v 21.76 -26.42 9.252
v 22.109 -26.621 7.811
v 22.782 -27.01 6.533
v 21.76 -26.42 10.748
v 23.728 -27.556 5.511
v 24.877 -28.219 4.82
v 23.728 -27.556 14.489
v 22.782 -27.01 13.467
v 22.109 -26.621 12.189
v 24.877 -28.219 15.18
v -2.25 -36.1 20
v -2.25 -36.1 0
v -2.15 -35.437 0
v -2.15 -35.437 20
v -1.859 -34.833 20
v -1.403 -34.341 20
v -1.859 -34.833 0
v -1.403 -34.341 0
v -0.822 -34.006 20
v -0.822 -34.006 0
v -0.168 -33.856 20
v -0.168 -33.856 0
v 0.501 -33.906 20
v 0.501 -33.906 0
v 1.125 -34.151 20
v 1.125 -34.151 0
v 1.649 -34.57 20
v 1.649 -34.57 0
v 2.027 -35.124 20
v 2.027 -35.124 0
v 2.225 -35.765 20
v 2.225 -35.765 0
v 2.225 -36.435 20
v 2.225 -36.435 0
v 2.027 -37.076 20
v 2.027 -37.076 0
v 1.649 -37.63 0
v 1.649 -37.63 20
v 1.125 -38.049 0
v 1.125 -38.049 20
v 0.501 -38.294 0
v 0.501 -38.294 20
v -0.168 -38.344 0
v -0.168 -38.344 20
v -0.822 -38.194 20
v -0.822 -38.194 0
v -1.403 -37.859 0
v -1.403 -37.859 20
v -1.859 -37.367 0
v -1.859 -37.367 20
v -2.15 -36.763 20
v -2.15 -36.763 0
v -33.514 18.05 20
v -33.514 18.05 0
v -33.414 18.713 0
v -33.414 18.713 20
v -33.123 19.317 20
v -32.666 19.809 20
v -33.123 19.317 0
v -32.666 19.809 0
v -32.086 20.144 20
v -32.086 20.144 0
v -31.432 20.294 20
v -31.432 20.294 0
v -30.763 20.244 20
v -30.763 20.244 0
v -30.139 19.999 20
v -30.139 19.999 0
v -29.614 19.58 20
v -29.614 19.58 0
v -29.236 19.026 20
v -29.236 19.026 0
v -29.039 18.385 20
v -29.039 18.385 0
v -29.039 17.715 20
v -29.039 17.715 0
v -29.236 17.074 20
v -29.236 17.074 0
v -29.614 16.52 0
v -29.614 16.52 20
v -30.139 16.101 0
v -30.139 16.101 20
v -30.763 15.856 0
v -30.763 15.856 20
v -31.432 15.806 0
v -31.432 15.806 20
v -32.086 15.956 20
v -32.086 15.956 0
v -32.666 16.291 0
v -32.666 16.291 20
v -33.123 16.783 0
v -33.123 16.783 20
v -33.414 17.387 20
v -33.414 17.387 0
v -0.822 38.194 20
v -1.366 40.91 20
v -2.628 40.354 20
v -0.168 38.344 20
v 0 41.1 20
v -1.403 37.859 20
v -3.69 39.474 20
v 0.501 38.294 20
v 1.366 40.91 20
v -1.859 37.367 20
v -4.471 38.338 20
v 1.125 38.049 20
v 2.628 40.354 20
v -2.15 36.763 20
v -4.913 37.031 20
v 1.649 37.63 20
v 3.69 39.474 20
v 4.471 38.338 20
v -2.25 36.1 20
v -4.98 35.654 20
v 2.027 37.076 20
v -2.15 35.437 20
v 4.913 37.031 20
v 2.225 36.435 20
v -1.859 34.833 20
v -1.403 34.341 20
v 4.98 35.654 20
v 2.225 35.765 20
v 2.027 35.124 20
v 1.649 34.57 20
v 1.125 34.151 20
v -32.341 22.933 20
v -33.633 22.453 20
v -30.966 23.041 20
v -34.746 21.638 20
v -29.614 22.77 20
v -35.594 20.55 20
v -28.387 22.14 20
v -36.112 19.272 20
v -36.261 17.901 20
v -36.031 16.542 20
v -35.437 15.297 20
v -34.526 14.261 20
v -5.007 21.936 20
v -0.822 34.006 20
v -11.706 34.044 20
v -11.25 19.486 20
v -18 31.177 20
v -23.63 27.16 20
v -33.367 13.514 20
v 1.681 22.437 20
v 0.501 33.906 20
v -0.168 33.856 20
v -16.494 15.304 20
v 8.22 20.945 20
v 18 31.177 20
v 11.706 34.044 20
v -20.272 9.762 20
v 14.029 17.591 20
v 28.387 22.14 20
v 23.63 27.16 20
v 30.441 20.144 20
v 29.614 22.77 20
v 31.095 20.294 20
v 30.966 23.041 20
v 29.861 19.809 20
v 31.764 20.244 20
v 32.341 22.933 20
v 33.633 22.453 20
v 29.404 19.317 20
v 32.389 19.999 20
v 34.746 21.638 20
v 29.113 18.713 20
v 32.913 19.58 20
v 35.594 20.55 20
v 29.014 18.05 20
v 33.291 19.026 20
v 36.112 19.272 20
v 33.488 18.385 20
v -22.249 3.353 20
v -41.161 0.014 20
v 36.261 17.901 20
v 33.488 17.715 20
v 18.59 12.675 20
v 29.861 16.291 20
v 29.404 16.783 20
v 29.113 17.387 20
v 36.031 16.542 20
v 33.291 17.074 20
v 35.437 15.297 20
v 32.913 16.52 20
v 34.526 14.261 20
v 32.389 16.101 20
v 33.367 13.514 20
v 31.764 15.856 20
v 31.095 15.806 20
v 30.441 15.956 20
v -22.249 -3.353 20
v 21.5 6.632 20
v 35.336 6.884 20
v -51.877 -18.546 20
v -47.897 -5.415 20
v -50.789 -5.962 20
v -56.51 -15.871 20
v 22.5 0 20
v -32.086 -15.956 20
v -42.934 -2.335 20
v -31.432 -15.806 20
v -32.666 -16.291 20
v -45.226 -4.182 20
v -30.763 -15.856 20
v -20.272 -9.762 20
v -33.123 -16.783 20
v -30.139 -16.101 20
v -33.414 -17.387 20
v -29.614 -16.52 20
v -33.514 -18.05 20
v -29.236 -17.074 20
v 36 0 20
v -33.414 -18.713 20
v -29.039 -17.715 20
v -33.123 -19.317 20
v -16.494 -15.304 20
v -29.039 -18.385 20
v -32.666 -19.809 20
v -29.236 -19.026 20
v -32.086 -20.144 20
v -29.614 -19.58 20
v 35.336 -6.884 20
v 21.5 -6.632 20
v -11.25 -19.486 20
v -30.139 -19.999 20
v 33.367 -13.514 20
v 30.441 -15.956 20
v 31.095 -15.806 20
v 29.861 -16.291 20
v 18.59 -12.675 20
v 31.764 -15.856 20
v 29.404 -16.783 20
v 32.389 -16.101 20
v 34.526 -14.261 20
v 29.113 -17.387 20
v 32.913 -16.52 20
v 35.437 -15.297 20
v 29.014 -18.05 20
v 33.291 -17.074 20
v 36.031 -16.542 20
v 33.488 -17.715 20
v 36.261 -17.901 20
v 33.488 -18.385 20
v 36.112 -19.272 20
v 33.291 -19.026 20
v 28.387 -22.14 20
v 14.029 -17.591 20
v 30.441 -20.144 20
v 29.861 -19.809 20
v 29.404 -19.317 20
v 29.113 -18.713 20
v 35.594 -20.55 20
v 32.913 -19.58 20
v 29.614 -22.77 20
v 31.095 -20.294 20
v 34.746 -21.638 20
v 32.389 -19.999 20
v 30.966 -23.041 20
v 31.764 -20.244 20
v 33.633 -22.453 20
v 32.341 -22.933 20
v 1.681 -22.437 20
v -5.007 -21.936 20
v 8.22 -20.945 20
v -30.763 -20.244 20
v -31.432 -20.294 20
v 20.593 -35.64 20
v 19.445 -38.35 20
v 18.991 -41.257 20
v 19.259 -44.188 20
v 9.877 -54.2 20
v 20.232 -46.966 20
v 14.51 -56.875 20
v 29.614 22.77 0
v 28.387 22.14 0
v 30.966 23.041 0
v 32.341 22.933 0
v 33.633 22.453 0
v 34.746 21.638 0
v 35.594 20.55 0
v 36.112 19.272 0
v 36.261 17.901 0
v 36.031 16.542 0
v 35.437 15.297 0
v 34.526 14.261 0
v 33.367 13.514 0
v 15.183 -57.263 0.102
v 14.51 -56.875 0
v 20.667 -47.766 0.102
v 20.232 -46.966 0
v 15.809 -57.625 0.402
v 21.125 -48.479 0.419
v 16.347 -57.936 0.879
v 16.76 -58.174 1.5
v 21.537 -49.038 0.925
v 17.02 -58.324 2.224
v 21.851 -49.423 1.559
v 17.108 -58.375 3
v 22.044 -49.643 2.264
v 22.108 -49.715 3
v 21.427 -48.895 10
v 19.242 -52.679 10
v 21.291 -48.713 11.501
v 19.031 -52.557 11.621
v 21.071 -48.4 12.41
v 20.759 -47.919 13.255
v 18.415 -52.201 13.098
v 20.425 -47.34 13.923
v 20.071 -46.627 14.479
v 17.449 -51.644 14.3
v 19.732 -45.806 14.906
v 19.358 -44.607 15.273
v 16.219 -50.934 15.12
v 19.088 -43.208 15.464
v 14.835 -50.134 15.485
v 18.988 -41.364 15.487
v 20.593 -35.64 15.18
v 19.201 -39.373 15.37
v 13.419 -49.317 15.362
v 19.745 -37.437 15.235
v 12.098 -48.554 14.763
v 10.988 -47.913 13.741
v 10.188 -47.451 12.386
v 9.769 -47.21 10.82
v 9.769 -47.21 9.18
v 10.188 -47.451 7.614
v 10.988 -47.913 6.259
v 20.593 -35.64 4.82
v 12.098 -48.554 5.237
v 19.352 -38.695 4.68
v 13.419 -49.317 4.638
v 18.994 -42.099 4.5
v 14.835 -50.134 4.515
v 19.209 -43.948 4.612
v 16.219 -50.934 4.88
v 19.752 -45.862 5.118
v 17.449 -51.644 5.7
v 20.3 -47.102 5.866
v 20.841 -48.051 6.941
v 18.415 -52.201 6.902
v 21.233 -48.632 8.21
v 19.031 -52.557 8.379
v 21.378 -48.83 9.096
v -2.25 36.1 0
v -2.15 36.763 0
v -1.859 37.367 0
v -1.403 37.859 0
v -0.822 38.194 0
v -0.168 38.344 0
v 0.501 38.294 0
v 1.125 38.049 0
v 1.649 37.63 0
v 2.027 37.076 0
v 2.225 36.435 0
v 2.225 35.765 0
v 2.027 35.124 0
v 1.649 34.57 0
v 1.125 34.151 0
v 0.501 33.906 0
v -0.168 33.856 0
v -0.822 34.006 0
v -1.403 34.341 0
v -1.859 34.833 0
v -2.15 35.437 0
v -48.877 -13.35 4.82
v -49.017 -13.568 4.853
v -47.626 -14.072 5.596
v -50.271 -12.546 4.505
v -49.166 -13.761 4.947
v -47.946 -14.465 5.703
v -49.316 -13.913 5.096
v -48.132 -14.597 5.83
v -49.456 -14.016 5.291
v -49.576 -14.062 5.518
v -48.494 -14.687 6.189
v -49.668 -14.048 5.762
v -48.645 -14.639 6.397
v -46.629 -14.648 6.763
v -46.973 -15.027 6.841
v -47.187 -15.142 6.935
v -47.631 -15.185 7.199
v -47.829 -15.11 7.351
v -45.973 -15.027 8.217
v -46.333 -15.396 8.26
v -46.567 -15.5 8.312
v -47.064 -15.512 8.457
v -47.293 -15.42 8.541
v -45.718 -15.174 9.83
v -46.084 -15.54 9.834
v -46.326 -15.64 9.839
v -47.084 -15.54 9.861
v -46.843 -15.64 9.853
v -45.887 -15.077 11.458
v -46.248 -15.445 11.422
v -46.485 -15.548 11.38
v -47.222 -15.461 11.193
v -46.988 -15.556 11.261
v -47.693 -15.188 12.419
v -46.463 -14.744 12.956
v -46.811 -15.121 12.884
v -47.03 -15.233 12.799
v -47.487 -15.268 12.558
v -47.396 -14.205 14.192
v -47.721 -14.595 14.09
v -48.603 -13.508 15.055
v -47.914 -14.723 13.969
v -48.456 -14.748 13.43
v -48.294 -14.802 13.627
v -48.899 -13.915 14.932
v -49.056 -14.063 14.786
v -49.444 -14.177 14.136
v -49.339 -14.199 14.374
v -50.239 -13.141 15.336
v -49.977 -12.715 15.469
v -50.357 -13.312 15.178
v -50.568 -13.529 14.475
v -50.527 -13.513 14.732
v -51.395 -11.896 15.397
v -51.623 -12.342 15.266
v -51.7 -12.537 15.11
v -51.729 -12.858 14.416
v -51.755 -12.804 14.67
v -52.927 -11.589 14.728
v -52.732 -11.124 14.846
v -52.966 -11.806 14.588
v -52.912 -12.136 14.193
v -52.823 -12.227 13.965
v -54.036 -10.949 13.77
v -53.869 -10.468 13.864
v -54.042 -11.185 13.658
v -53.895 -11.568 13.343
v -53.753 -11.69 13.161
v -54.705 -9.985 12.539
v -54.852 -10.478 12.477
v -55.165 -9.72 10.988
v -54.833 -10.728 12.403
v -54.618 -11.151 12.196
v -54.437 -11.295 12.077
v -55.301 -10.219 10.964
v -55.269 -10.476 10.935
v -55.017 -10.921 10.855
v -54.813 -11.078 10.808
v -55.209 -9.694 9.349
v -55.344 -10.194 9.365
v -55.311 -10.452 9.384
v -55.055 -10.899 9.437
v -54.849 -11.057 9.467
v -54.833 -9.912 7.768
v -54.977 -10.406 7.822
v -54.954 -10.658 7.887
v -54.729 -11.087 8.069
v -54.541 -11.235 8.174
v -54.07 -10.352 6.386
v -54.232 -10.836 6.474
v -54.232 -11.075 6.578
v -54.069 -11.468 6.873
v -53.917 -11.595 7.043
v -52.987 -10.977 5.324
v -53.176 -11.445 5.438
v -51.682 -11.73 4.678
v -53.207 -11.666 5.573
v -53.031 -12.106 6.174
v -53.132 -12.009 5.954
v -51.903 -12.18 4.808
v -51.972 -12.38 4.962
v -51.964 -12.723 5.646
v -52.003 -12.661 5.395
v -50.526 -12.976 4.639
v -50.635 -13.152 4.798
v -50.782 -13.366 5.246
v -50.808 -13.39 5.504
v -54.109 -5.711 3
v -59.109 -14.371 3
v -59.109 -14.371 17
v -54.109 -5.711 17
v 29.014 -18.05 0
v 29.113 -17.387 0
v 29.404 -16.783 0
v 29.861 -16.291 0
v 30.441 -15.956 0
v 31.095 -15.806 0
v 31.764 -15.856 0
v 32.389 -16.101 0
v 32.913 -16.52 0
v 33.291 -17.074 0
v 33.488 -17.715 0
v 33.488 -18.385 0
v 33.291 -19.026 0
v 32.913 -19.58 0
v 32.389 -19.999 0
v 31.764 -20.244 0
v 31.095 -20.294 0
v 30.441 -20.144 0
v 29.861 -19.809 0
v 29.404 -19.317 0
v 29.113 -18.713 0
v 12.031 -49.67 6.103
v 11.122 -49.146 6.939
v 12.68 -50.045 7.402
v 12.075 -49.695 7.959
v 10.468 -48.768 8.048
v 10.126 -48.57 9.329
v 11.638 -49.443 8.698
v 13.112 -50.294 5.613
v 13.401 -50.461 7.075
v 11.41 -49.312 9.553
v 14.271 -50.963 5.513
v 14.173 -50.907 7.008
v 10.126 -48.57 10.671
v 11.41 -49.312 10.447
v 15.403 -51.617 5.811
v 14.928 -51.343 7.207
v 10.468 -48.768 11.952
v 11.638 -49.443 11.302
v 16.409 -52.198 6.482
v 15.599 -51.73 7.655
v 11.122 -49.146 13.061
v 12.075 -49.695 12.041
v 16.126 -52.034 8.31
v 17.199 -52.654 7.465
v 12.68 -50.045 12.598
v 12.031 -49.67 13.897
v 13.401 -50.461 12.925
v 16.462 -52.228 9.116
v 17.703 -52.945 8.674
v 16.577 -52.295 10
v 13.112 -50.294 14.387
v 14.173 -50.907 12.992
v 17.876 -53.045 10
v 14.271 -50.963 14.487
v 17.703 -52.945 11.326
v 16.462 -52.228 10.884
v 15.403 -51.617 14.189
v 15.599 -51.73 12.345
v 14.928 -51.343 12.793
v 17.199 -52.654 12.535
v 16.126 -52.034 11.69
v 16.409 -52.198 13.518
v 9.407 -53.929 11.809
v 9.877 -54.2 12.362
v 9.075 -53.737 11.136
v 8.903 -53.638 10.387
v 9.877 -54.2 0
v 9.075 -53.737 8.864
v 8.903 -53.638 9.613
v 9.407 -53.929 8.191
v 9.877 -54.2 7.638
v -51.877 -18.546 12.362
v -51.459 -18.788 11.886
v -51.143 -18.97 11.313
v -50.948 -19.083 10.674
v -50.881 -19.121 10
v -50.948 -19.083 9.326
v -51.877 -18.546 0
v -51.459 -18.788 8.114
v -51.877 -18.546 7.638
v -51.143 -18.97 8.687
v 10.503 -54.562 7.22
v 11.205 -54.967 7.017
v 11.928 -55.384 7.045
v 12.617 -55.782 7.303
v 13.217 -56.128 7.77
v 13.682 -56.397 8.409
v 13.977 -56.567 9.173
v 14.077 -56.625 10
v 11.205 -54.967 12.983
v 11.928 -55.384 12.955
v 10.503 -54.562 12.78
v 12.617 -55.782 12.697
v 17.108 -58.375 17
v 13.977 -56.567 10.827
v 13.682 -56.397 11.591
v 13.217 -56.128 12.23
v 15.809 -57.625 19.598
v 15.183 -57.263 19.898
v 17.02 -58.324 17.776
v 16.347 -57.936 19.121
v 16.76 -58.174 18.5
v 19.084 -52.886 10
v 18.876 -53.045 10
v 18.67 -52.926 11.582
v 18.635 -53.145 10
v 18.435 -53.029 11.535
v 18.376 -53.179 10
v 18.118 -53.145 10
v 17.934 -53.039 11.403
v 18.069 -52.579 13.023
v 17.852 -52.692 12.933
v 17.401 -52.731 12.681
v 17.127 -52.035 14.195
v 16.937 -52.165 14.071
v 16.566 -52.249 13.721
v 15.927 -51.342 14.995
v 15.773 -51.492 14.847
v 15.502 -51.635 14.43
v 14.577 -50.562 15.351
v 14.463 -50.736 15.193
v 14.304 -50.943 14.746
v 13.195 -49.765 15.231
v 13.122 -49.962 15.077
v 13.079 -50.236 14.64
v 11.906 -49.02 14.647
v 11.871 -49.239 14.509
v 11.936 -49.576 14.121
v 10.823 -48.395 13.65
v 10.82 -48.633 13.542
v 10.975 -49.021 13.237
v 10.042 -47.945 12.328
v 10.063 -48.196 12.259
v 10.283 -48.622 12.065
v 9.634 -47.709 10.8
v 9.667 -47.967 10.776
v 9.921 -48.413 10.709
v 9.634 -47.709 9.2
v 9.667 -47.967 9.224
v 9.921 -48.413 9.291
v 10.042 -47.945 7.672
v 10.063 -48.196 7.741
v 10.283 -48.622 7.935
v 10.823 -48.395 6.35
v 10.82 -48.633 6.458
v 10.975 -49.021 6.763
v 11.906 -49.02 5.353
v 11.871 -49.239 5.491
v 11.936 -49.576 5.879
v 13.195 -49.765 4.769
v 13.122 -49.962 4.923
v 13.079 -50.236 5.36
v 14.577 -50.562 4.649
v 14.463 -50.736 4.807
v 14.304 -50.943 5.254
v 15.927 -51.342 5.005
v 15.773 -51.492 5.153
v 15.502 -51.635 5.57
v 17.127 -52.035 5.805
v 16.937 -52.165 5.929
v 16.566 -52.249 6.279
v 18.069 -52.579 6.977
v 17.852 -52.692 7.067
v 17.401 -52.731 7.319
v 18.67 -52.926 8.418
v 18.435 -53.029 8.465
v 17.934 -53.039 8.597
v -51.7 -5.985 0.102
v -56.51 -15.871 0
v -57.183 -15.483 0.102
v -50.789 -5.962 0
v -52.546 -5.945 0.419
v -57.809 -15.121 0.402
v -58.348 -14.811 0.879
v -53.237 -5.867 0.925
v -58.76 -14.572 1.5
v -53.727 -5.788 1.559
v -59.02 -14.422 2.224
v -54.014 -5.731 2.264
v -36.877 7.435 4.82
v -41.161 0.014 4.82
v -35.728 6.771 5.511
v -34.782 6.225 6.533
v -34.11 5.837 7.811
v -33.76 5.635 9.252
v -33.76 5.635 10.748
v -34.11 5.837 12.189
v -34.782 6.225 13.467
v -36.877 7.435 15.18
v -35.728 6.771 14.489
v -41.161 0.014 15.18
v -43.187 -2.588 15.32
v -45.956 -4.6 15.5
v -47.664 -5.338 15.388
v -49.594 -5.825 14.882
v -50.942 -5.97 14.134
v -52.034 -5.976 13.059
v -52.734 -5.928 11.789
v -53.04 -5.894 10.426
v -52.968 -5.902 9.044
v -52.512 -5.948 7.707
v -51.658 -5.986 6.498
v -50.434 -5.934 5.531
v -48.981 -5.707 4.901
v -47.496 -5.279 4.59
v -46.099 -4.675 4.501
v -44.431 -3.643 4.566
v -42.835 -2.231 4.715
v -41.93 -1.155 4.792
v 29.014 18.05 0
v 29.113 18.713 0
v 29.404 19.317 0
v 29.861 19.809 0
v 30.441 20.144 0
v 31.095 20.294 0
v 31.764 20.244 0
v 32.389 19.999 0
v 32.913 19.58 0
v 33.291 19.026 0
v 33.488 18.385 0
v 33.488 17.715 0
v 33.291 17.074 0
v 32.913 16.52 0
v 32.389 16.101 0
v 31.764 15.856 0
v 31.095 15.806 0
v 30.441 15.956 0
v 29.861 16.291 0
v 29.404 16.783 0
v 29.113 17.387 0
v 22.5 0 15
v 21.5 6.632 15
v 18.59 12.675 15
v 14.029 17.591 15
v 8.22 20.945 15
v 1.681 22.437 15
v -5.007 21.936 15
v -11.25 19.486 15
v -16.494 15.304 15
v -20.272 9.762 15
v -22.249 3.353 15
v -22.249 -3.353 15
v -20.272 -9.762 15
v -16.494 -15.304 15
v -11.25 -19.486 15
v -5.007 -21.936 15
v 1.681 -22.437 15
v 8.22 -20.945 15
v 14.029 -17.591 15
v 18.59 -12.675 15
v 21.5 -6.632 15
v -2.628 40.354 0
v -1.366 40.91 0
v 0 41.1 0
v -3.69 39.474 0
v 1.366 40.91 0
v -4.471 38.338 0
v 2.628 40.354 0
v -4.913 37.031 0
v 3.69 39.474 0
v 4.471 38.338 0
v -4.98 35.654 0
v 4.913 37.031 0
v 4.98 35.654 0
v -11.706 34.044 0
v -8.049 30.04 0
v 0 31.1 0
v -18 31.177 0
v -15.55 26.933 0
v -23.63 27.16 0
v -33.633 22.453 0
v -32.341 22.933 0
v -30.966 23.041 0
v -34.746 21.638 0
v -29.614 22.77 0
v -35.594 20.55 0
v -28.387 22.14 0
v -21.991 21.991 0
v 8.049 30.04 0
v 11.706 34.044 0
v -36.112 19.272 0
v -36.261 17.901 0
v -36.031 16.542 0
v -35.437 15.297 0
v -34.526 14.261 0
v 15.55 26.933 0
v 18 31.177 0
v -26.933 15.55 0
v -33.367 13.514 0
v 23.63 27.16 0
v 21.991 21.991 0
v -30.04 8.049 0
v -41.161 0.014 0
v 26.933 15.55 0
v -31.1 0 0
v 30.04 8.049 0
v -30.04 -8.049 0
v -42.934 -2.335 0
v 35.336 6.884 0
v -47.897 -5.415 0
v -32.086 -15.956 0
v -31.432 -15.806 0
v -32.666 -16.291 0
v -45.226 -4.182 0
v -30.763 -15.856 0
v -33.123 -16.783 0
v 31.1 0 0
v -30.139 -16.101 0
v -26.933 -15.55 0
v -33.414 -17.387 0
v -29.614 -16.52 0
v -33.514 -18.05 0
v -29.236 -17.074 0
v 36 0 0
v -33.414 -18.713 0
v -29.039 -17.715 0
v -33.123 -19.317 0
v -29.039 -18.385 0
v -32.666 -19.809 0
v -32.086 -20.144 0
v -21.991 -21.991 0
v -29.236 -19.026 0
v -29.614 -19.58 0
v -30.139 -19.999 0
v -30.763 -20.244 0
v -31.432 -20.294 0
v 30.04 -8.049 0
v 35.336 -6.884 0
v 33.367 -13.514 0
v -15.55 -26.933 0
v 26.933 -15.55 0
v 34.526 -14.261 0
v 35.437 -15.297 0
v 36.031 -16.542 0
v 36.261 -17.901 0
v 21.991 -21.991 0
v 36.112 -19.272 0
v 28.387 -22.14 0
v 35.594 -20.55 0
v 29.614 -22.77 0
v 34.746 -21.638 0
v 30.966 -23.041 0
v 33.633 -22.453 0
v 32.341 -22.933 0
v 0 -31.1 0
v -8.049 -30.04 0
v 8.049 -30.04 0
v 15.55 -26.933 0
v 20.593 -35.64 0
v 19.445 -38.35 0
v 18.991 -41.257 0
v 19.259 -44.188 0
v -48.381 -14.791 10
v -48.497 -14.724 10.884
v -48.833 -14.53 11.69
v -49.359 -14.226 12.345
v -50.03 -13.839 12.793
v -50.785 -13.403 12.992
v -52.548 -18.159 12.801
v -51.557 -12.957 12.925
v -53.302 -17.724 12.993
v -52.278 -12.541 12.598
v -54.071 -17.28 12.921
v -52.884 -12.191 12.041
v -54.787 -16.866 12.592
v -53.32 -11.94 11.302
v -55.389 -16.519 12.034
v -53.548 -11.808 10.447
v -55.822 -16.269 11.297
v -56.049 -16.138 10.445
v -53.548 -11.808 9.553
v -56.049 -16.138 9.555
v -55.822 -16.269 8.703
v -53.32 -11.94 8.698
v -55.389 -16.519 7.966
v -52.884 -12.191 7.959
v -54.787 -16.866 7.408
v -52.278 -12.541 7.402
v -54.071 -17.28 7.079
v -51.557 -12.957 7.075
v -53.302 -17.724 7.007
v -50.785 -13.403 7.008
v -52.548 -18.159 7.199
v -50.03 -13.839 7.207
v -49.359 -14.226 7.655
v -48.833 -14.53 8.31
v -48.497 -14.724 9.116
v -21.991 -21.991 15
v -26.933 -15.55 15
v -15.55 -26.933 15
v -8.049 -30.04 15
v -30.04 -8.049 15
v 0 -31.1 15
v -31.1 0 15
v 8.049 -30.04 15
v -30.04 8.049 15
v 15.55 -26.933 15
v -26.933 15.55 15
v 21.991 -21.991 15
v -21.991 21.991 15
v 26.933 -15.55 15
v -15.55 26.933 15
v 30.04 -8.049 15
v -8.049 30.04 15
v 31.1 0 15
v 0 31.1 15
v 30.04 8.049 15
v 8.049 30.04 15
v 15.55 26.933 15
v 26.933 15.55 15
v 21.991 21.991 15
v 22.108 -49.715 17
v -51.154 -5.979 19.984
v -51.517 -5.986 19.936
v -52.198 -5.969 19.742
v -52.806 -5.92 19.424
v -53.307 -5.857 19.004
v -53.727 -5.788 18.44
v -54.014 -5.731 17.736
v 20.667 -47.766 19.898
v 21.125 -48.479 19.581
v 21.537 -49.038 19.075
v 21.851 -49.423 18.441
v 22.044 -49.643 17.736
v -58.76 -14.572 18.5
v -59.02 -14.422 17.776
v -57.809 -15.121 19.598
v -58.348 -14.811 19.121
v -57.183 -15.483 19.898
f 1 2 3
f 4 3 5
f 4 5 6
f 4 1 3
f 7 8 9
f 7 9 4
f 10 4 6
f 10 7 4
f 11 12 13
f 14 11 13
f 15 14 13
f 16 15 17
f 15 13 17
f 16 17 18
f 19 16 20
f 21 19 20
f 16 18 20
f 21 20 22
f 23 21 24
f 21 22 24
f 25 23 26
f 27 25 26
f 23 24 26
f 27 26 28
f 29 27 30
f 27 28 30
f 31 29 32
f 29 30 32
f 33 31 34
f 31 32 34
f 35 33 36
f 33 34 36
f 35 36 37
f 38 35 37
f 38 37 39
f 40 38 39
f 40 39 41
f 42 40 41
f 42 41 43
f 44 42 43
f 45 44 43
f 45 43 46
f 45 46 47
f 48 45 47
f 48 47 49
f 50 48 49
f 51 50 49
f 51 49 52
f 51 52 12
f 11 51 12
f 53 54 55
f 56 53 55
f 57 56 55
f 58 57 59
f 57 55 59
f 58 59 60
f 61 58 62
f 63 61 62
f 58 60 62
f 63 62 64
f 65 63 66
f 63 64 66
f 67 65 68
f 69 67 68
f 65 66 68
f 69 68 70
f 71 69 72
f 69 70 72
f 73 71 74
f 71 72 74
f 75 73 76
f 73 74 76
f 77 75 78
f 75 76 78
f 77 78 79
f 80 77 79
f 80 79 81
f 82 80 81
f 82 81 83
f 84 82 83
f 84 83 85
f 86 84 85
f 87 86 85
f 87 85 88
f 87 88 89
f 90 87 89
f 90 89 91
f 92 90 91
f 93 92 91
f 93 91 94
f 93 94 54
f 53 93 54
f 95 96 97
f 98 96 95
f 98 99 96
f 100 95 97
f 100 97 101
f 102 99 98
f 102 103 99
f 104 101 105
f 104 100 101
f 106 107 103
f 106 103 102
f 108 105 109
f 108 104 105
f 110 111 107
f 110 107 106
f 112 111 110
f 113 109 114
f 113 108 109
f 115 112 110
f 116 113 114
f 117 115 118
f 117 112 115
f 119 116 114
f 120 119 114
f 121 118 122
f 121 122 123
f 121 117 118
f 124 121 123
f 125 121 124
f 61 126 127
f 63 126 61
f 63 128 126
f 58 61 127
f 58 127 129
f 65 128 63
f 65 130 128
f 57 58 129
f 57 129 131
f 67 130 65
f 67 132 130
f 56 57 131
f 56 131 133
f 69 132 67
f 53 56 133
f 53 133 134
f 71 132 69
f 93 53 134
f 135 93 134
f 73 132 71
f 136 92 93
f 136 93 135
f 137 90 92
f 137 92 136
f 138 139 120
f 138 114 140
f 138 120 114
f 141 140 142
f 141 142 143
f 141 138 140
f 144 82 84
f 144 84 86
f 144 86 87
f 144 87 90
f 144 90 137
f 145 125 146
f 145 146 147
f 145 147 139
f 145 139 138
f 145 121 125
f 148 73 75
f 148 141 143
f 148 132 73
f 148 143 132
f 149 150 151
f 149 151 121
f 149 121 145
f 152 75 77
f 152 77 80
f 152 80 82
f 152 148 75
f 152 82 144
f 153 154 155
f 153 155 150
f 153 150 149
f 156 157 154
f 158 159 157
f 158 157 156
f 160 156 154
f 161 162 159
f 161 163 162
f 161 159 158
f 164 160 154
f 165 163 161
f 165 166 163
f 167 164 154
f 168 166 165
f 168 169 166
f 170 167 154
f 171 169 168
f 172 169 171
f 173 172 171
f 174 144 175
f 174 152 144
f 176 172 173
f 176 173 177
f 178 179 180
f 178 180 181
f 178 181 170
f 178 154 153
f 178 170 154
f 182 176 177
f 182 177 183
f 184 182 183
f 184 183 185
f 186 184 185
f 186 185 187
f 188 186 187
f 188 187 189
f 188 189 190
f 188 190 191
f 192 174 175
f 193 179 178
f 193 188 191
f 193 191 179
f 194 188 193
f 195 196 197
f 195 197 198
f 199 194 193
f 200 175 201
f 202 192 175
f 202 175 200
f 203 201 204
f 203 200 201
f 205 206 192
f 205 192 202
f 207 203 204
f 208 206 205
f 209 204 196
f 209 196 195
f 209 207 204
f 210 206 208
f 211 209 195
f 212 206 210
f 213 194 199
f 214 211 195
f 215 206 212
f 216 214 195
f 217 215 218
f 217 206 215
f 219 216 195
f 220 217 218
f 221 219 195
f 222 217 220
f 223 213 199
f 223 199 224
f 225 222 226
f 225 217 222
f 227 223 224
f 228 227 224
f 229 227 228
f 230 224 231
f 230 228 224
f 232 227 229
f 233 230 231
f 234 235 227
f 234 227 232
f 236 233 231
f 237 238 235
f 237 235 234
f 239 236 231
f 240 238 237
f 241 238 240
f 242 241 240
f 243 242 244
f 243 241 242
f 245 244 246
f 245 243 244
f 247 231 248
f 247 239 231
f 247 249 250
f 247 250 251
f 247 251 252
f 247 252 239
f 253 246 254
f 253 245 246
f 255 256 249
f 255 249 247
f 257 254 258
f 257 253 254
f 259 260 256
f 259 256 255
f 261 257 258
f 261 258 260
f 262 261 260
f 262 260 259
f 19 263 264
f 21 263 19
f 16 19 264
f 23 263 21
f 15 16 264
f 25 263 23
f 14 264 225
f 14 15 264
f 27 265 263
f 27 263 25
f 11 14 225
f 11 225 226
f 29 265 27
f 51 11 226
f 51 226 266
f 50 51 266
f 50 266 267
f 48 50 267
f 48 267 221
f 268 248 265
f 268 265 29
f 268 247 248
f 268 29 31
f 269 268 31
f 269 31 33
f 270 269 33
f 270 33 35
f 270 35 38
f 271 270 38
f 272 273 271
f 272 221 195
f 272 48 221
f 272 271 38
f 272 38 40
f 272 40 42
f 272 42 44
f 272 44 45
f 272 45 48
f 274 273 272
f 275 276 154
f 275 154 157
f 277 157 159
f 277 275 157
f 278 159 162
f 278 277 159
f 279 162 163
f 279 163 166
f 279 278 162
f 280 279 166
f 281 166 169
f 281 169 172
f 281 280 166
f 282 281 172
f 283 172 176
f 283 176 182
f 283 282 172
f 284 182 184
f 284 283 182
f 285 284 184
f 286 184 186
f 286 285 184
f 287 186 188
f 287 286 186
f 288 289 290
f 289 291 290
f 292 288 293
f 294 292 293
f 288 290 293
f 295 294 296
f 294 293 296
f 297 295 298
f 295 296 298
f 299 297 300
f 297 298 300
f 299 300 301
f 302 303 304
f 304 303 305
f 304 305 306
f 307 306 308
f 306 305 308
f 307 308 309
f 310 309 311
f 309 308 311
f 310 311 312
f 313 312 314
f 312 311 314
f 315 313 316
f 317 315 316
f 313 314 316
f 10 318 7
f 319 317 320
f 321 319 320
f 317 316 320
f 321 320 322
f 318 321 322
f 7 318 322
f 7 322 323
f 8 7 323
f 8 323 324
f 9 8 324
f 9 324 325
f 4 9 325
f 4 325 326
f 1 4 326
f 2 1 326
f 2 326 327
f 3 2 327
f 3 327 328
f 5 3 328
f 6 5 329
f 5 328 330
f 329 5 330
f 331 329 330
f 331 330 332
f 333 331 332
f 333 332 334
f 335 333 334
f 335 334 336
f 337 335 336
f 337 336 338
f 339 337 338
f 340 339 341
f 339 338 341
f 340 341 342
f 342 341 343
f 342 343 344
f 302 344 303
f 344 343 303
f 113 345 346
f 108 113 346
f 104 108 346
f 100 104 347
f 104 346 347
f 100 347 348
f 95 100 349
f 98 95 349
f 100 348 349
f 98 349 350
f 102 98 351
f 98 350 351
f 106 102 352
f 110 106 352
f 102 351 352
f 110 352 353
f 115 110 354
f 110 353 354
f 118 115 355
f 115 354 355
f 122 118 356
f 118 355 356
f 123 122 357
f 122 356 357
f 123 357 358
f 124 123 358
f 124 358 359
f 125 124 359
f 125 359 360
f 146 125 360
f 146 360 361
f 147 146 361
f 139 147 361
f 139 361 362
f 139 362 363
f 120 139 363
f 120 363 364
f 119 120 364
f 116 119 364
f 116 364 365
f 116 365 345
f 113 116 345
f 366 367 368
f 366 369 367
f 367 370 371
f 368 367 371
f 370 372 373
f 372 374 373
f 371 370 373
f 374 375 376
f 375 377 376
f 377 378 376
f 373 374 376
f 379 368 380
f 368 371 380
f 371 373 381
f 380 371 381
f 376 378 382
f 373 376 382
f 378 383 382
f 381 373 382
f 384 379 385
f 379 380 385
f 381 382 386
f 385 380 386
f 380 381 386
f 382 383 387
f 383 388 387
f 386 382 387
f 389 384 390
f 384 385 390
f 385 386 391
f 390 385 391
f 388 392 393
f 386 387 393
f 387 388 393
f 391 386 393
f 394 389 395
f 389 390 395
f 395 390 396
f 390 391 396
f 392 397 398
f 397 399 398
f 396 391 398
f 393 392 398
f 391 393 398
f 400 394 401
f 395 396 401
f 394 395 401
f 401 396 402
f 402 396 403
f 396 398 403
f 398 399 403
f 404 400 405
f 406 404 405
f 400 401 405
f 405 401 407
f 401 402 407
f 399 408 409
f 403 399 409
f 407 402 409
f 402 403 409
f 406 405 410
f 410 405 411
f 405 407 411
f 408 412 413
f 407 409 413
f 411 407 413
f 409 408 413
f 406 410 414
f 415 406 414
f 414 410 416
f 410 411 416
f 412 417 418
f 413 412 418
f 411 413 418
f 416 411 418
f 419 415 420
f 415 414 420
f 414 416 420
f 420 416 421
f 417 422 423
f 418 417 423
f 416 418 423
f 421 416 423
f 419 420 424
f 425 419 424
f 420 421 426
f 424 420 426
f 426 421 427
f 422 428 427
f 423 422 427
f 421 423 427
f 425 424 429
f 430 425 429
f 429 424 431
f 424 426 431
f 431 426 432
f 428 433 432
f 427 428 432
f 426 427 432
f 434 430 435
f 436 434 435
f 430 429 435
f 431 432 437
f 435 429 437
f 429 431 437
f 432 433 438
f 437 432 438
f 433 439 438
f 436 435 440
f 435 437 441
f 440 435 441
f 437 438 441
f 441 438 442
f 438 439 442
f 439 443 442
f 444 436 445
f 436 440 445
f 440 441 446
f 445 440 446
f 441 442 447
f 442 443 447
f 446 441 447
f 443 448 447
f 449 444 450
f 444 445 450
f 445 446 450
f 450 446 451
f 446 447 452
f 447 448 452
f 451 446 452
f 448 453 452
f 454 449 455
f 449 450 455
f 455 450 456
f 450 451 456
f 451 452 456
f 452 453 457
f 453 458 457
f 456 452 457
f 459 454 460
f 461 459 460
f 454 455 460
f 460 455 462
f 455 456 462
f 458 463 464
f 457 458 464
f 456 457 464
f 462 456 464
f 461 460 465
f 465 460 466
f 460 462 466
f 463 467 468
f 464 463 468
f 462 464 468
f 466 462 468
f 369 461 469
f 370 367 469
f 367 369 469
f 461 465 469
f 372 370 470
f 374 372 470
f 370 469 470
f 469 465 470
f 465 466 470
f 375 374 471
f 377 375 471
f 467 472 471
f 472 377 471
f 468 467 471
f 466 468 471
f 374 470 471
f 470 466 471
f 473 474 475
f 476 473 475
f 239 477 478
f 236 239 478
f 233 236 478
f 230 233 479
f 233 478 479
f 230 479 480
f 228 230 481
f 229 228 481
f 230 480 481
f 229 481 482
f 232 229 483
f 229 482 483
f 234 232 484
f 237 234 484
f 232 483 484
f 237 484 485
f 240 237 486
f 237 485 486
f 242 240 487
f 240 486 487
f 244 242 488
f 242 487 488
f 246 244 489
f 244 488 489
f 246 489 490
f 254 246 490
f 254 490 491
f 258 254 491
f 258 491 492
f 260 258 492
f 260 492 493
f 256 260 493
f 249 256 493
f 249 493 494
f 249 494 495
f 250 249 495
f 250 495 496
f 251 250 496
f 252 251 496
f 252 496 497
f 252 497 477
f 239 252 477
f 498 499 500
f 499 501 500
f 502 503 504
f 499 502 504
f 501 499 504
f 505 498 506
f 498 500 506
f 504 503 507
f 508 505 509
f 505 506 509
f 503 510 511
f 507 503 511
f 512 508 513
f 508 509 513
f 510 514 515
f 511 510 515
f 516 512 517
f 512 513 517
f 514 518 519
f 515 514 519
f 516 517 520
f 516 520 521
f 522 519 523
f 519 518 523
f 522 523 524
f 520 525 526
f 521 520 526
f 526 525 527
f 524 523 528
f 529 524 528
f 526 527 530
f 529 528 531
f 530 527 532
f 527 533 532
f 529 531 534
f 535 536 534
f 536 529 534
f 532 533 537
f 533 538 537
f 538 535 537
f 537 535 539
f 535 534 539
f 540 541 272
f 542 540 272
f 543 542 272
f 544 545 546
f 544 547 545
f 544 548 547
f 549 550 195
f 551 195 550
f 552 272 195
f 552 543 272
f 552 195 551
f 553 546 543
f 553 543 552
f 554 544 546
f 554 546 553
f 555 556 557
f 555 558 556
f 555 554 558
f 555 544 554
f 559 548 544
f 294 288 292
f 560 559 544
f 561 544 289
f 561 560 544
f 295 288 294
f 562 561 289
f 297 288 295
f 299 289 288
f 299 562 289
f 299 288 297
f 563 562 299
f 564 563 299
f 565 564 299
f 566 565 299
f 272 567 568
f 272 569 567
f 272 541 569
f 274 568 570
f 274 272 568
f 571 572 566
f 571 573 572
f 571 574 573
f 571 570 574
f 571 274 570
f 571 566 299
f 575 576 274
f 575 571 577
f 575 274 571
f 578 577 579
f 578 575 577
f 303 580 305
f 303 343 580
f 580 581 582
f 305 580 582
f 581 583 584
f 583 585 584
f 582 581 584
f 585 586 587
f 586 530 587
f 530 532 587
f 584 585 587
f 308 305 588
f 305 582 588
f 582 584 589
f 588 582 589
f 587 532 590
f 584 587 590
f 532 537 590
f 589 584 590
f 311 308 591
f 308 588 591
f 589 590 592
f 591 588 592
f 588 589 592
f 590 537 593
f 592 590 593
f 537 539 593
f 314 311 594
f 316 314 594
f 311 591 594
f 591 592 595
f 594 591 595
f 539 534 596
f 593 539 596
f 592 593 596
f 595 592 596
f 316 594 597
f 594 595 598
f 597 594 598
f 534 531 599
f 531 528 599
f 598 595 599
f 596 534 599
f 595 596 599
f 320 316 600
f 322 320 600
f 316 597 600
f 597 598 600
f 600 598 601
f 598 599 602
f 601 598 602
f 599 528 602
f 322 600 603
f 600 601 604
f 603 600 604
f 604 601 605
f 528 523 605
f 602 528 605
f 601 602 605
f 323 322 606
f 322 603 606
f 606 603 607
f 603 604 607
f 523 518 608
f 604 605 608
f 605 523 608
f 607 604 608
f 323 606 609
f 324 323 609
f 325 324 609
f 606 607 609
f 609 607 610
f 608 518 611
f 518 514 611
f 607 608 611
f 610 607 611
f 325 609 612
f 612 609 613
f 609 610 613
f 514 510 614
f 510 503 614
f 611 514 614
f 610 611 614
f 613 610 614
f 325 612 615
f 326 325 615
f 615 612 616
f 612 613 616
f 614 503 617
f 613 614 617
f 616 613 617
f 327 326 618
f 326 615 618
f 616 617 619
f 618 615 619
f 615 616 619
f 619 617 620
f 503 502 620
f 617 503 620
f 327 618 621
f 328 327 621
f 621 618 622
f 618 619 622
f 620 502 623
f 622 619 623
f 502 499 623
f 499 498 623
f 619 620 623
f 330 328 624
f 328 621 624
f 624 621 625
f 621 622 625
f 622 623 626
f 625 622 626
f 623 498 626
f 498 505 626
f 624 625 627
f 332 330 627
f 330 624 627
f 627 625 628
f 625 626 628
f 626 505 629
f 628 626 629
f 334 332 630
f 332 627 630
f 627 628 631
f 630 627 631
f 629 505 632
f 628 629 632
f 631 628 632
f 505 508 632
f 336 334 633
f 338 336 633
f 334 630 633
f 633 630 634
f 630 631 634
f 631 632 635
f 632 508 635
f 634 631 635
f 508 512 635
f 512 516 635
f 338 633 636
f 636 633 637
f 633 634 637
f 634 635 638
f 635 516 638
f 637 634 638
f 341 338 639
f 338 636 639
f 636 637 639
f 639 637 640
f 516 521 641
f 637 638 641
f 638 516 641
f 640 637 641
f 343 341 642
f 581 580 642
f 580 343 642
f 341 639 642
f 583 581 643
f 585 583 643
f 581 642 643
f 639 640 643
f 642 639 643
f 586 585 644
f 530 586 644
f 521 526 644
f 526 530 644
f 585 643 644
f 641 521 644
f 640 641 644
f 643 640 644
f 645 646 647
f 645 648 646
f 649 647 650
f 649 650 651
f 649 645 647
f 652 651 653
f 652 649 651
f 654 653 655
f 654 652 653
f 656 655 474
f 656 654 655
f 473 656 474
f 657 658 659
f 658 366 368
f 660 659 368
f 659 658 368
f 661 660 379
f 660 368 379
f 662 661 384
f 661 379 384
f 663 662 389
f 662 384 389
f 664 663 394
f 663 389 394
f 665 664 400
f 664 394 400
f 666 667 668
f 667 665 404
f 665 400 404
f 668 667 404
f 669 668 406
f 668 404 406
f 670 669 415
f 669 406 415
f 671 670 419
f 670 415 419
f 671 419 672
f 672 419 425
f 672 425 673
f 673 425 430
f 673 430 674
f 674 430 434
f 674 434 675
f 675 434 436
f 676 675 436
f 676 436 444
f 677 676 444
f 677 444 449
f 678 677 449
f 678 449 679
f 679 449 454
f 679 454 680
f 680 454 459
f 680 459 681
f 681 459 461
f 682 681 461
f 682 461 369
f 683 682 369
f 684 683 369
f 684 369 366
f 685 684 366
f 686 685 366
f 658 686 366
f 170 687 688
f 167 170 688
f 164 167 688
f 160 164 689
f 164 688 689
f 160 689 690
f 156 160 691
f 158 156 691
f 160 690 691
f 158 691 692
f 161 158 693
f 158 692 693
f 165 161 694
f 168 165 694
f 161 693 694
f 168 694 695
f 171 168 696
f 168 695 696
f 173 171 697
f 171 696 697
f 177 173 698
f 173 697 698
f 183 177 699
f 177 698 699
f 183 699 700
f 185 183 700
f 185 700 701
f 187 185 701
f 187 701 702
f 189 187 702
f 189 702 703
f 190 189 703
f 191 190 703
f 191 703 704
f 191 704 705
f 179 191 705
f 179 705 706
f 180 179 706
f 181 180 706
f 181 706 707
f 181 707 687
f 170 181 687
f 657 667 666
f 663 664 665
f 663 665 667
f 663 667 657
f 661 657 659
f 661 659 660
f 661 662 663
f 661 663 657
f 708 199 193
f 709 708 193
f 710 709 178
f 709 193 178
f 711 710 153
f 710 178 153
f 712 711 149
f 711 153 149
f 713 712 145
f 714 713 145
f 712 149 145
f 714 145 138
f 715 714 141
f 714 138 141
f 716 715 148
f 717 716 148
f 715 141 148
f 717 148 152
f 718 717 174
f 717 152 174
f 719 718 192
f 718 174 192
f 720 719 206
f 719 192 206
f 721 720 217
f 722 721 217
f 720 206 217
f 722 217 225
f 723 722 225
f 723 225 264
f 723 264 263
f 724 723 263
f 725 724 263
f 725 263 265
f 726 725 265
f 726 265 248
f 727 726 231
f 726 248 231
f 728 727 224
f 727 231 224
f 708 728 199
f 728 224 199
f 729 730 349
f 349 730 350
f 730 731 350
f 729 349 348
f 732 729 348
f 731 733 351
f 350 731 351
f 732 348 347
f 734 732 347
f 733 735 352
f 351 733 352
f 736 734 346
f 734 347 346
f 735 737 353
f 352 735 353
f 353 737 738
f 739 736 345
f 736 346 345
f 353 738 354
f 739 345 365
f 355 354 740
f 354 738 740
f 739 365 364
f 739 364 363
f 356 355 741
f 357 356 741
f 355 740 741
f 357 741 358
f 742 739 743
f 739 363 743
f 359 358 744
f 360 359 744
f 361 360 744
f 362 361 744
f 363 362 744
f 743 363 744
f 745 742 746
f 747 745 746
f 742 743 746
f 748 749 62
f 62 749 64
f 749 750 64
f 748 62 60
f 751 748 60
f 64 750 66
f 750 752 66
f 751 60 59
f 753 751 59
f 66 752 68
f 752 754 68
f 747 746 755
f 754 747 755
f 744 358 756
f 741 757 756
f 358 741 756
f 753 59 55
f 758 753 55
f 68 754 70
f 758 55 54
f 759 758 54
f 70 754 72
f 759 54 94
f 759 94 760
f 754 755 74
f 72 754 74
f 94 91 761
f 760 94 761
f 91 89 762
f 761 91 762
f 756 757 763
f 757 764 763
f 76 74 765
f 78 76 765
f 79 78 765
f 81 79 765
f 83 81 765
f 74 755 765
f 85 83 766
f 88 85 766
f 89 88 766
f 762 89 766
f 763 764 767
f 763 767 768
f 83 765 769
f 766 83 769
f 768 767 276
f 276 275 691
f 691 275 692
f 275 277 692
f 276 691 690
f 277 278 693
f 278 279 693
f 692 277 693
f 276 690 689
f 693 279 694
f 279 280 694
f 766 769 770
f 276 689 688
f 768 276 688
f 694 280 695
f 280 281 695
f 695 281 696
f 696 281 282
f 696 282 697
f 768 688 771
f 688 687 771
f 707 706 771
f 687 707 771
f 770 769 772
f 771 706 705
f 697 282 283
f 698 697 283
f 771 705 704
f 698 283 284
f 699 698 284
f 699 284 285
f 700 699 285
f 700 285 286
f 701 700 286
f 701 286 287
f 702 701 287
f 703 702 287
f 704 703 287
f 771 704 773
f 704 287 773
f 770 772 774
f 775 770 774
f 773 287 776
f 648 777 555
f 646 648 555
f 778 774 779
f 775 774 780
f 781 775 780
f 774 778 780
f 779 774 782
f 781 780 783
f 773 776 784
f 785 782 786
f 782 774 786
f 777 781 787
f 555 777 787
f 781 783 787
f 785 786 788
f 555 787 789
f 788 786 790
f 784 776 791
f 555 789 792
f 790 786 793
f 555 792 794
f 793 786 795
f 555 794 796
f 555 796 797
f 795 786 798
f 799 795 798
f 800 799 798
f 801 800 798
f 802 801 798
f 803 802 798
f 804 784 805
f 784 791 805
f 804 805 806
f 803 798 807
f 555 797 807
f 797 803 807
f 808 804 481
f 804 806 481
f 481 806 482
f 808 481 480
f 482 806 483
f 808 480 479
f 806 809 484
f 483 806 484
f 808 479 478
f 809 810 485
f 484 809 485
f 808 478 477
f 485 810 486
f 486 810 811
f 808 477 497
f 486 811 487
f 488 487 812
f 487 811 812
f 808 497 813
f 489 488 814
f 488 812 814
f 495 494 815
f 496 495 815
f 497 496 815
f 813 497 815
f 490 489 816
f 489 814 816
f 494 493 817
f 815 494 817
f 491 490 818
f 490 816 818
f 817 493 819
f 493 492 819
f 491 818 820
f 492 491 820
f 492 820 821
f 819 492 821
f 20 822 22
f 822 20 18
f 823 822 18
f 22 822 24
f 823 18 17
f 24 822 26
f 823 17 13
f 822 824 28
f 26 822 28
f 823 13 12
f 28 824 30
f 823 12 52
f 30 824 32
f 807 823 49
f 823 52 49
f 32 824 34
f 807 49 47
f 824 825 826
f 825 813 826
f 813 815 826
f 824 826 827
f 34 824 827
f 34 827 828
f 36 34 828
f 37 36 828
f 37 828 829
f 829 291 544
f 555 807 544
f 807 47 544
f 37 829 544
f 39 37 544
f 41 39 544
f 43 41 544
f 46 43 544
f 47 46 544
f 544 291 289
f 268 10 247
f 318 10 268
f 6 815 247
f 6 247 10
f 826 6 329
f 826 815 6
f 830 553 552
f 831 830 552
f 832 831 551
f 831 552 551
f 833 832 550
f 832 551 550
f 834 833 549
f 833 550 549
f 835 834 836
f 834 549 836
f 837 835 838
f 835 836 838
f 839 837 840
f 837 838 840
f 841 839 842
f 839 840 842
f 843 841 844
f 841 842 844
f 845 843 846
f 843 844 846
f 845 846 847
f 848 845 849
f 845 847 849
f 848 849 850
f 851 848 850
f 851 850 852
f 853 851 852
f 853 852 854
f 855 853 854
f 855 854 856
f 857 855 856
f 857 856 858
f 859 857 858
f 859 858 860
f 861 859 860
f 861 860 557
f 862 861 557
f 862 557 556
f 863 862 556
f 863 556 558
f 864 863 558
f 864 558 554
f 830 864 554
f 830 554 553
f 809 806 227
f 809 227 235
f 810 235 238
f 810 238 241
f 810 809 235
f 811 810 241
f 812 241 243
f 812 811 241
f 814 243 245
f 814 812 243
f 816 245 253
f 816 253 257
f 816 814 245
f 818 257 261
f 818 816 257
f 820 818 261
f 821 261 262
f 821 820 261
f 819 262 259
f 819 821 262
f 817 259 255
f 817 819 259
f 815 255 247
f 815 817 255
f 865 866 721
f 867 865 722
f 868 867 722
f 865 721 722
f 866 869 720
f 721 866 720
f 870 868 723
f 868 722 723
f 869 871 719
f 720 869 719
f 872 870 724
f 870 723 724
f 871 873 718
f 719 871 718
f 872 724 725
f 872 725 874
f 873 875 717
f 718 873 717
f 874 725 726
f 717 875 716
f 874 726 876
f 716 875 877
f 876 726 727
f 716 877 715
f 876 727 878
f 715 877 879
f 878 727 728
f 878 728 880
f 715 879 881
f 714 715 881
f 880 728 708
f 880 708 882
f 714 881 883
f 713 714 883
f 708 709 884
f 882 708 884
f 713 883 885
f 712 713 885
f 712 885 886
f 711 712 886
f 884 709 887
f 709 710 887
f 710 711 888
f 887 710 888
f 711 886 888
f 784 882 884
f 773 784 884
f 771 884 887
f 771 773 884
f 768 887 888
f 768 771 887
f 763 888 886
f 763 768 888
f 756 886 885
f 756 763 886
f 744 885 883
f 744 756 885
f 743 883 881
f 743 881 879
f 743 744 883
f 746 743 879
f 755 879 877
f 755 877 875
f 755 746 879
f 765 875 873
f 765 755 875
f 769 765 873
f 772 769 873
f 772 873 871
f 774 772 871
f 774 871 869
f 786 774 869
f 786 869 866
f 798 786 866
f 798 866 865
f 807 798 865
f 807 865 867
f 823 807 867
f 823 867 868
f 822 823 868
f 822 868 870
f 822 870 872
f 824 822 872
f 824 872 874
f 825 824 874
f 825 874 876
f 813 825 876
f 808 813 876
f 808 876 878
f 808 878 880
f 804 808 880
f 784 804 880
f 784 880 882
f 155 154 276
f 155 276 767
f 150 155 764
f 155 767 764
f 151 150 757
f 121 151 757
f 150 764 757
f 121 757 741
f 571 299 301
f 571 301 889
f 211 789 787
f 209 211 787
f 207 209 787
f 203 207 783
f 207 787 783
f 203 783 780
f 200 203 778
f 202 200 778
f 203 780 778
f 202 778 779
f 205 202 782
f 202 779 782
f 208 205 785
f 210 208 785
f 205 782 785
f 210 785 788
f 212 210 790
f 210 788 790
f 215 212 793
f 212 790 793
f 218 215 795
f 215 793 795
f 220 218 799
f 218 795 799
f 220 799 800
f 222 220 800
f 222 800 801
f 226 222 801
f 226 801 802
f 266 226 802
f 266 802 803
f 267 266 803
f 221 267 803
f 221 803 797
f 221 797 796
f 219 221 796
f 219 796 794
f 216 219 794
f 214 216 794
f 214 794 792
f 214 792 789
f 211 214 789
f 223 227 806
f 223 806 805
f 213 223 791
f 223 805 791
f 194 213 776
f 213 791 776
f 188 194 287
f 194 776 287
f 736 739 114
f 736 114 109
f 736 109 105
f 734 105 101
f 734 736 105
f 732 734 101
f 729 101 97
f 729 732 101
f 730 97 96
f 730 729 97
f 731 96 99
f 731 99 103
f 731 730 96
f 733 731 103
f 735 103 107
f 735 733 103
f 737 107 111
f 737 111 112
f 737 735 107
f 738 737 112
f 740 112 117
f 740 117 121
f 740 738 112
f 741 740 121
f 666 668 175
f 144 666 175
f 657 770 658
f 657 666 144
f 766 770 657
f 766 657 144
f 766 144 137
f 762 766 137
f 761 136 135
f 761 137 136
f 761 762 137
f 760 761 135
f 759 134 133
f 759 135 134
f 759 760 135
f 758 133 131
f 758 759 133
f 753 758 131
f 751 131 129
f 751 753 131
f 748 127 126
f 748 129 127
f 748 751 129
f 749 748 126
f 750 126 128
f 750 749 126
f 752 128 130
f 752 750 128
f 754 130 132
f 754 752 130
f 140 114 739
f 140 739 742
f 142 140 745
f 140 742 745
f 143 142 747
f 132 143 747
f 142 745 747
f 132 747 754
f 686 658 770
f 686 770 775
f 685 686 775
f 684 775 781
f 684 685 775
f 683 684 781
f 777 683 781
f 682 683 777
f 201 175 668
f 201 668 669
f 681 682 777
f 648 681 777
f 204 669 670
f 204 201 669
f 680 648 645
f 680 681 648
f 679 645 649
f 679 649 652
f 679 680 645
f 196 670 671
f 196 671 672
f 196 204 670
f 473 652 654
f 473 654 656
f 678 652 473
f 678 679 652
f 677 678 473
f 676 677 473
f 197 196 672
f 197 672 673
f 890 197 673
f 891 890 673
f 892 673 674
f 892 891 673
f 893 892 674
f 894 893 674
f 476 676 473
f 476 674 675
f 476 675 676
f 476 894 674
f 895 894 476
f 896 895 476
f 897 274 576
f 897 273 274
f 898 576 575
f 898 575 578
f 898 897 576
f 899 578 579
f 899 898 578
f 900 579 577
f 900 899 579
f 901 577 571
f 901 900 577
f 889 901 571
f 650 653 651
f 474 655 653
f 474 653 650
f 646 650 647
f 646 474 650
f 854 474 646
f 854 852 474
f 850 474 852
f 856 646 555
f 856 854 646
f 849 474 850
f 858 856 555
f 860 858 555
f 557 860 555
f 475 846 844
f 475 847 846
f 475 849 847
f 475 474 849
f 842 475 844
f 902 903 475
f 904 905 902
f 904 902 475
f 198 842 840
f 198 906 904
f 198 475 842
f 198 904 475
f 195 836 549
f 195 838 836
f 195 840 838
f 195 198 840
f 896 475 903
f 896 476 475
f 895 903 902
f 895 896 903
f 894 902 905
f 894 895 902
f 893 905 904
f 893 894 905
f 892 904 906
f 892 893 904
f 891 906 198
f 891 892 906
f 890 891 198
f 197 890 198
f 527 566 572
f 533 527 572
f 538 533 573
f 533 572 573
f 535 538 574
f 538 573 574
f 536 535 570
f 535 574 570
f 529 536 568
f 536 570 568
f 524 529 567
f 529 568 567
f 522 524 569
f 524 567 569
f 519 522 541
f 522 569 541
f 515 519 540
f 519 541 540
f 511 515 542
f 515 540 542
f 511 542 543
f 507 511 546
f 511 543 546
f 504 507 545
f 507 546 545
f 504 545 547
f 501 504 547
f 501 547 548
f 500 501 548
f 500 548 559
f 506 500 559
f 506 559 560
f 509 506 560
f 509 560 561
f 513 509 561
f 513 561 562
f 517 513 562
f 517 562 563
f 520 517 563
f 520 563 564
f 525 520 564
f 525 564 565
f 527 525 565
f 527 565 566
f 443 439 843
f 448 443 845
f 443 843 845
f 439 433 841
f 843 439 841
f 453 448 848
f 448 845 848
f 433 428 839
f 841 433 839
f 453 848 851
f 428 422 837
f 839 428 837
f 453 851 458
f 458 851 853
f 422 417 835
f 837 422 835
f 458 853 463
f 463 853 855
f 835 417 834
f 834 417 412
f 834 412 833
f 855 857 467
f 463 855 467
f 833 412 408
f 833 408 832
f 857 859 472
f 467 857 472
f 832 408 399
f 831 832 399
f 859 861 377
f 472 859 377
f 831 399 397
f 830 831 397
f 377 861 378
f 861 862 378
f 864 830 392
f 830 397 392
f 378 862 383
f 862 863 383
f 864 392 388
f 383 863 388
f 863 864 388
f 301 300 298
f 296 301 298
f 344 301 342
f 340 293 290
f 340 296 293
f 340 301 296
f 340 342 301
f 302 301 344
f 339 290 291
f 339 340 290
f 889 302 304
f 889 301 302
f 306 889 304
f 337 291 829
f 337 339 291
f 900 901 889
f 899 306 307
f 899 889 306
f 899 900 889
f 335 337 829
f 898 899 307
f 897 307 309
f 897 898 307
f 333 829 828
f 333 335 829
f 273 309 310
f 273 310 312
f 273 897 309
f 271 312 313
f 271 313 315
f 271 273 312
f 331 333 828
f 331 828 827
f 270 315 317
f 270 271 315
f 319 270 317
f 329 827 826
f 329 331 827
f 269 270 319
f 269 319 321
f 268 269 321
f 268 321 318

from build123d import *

# Parameters (mm, degrees)
SKETCH1_R           = 36
SKETCH1_R_2         = 31.1
BOSS_EXTRUDE1_DEPTH = 15
SKETCH2_R           = 36
BOSS_EXTRUDE2_DEPTH = 5
SKETCH3_R           = 22.5
CUT_EXTRUDE1_DEPTH  = 5
SKETCH4_R           = 5
BOSS_EXTRUDE3_DEPTH = 20
BOSS_EXTRUDE4_DEPTH = 20
SKETCH7_R           = 2.25
CUT_EXTRUDE2_DEPTH  = 78.645922206
SKETCH9_W           = 8.35
SKETCH9_H           = 20
BOSS_EXTRUDE5_DEPTH = 10
FILLET1_R           = 12
SKETCH10_R          = 3
CUT_EXTRUDE3_DEPTH  = 30
CUT_EXTRUDE5_START  = -5
SKETCH10_4_R        = 5.5
SKETCH10_4_R_2      = 3
CUT_EXTRUDE5_DEPTH  = 25
FILLET2_R           = 3
FILLET3_R           = 1


with BuildPart() as part:
    # Sketch1 → Boss-Extrude1 (new body)
    with BuildSketch(Plane.XY):
        Circle(SKETCH1_R)
        Circle(SKETCH1_R_2, mode=Mode.SUBTRACT)
    extrude(amount=BOSS_EXTRUDE1_DEPTH)

    # Sketch2 → Boss-Extrude2 (add)
    with BuildSketch(Plane.XY.offset(15)):
        Circle(SKETCH2_R)
    extrude(amount=BOSS_EXTRUDE2_DEPTH)

    # Sketch3 → Cut-Extrude1 (cut)
    with BuildSketch(Plane.XY.offset(20)):
        Circle(SKETCH3_R)
    extrude(amount=-CUT_EXTRUDE1_DEPTH, mode=Mode.SUBTRACT)

    # Sketch4 → Boss-Extrude3 (add)
    with BuildSketch(Plane(origin=(0, 0, 0), x_dir=(-1, 0, 0), z_dir=(0, 0, -1))):
        with Locations((0, 36.1)):
            Circle(SKETCH4_R)
        with Locations((31.263517077, 18.05)):
            Circle(SKETCH4_R)
        with Locations((31.263517077, -18.05)):
            Circle(SKETCH4_R)
        with Locations((0, -36.1)):
            Circle(SKETCH4_R)
        with Locations((-31.263517077, -18.05)):
            Circle(SKETCH4_R)
        with Locations((-31.263517077, 18.05)):
            Circle(SKETCH4_R)
    extrude(amount=-BOSS_EXTRUDE3_DEPTH)

    # Sketch8 → Boss-Extrude4 (add)
    with BuildSketch(Plane(origin=(0, 0, 0), x_dir=(-1, 0, 0), z_dir=(0, 0, -1))):
        with BuildLine():
            Line((-28.387135314, -22.139795588), (-9.877135314, -54.200056036))
            Line((-9.877135314, -54.200056036), (51.877193071, -18.54617792))
            Line((51.877193071, -18.54617792), (33.367193071, 13.514082528))
            ThreePointArc((33.367193071, 13.514082528), (18, -31.176914536), (-28.387135314, -22.139795588))
        make_face()
    extrude(amount=-BOSS_EXTRUDE4_DEPTH)

    # Sketch7 → Cut-Extrude2 (cut, through all)
    with BuildSketch(Plane(origin=(0, 0, 0), x_dir=(-1, 0, 0), z_dir=(0, 0, -1))):
        with Locations((-31.263517077, 18.05)):
            Circle(SKETCH7_R)
        with Locations((0, 36.1)):
            Circle(SKETCH7_R)
        with Locations((31.263517077, 18.05)):
            Circle(SKETCH7_R)
        with Locations((31.263517077, -18.05)):
            Circle(SKETCH7_R)
        with Locations((0, -36.1)):
            Circle(SKETCH7_R)
        with Locations((-31.263517077, -18.05)):
            Circle(SKETCH7_R)
    extrude(amount=-CUT_EXTRUDE2_DEPTH, mode=Mode.SUBTRACT)

    # Sketch9 → Boss-Extrude5 (add)
    with BuildSketch(Plane(origin=(-21.000028879, -36.373116978, 0), x_dir=(0.8660254037844385, -0.5000000000000004, 0), z_dir=(-0.5000000000000003, -0.8660254037844384, 0))):
        with Locations((-39.828878116, 10)):
            Rectangle(SKETCH9_W, SKETCH9_H)
        with Locations((39.828878116, 10)):
            Rectangle(SKETCH9_W, SKETCH9_H)
    extrude(amount=-BOSS_EXTRUDE5_DEPTH)

    # Fillet1
    # the kernel refuses this fillet: 12 mm, written as the material it adds along each edge
    with BuildSketch(Plane(origin=(-46.877193071, -9.885923882, 20), x_dir=(-0.8660254037844379, 0.500000000000001, 0), z_dir=(0, 0, -1))) as fillet1_piece_1:
        with BuildLine():
            CenterArc((12, 11.431425983), FILLET1_R, 180, 72.29196439)
            Line((0, 11.431425983), (-0.24, 11.431425983))
            Line((-0.24, 11.431425983), (-0.24, 0))
            Line((-0.24, 0), (0, -0.24))
            ThreePointArc((0, -0.24), (4.175, -0.24), (8.277, -0.22862852))
            Line((8.277, -0.22862852), (8.35, 0))
        make_face()
    extrude(amount=20)
    with BuildSketch(Plane(origin=(14.877135314, -45.539801998, 20), x_dir=(0.5000000000000003, 0.8660254037844385, 0), z_dir=(0, 0, -1))) as fillet1_piece_2:
        with BuildLine():
            CenterArc((11.431425983, 12), FILLET1_R, 197.70803561, 72.29196439)
            Line((0, 8.35), (-0.22862852, 8.277))
            ThreePointArc((-0.22862852, 8.277), (-0.24, 4.175), (-0.24, 0))
            Line((-0.24, 0), (0, -0.24))
            Line((0, -0.24), (11.431425983, -0.24))
            Line((11.431425983, -0.24), (11.431425983, 0))
        make_face()
    extrude(amount=20)

    # Sketch10 → Cut-Extrude3 (cut)
    with BuildSketch(Plane(origin=(-21.000028879, -36.373116978, 0), x_dir=(0.8660254037844385, -0.5000000000000004, 0), z_dir=(-0.5000000000000003, -0.8660254037844384, 0))):
        with Locations((37.503878116, 10)):
            Circle(SKETCH10_R)
        with Locations((-37.503878116, 10)):
            Circle(SKETCH10_R)
    extrude(amount=-CUT_EXTRUDE3_DEPTH, mode=Mode.SUBTRACT)

    # Sketch10<4> → Cut-Extrude5 (cut)
    # profile 1 of 2: a face of its own
    with BuildSketch(Plane(origin=(-21.000028879, -36.373116978, 0), x_dir=(0.8660254037844385, -0.5000000000000004, 0), z_dir=(-0.5000000000000003, -0.8660254037844384, 0)).offset(CUT_EXTRUDE5_START)):
        with Locations((37.503878116, 10)):
            Circle(SKETCH10_4_R)
        with Locations((37.503878116, 10)):
            Circle(SKETCH10_4_R_2, mode=Mode.SUBTRACT)
    # profile 2 of 2: a face of its own
    with BuildSketch(Plane(origin=(-21.000028879, -36.373116978, 0), x_dir=(0.8660254037844385, -0.5000000000000004, 0), z_dir=(-0.5000000000000003, -0.8660254037844384, 0)).offset(CUT_EXTRUDE5_START)):
        with Locations(Location((-37.503878116, 10, 0), (0, 0, 289.655481315))):
            Circle(SKETCH10_4_R)
        with Locations((-37.503878116, 10)):
            Circle(SKETCH10_4_R_2, mode=Mode.SUBTRACT)
    extrude(amount=-CUT_EXTRUDE5_DEPTH, mode=Mode.SUBTRACT)

    # Fillet2
    fillet2_edges = [part.edges().sort_by_distance(p)[0] for p in [
        (-56.608505192, -10.041050901, 0),
        (-56.608505192, -10.041050901, 20),
        (19.608447435, -54.044929017, 0),
        (19.608447435, -54.044929017, 20),
    ]]
    fillet(fillet2_edges, radius=FILLET2_R)

    # Fillet3
    fillet3_edges = [part.edges().sort_by_distance(p)[0] for p in [
        (-52.581487065, -12.366050901, 15.179527005),
        (9.21614259, -48.044929017, 10),
    ]]
    fillet(fillet3_edges, radius=FILLET3_R)


solid = part.part
